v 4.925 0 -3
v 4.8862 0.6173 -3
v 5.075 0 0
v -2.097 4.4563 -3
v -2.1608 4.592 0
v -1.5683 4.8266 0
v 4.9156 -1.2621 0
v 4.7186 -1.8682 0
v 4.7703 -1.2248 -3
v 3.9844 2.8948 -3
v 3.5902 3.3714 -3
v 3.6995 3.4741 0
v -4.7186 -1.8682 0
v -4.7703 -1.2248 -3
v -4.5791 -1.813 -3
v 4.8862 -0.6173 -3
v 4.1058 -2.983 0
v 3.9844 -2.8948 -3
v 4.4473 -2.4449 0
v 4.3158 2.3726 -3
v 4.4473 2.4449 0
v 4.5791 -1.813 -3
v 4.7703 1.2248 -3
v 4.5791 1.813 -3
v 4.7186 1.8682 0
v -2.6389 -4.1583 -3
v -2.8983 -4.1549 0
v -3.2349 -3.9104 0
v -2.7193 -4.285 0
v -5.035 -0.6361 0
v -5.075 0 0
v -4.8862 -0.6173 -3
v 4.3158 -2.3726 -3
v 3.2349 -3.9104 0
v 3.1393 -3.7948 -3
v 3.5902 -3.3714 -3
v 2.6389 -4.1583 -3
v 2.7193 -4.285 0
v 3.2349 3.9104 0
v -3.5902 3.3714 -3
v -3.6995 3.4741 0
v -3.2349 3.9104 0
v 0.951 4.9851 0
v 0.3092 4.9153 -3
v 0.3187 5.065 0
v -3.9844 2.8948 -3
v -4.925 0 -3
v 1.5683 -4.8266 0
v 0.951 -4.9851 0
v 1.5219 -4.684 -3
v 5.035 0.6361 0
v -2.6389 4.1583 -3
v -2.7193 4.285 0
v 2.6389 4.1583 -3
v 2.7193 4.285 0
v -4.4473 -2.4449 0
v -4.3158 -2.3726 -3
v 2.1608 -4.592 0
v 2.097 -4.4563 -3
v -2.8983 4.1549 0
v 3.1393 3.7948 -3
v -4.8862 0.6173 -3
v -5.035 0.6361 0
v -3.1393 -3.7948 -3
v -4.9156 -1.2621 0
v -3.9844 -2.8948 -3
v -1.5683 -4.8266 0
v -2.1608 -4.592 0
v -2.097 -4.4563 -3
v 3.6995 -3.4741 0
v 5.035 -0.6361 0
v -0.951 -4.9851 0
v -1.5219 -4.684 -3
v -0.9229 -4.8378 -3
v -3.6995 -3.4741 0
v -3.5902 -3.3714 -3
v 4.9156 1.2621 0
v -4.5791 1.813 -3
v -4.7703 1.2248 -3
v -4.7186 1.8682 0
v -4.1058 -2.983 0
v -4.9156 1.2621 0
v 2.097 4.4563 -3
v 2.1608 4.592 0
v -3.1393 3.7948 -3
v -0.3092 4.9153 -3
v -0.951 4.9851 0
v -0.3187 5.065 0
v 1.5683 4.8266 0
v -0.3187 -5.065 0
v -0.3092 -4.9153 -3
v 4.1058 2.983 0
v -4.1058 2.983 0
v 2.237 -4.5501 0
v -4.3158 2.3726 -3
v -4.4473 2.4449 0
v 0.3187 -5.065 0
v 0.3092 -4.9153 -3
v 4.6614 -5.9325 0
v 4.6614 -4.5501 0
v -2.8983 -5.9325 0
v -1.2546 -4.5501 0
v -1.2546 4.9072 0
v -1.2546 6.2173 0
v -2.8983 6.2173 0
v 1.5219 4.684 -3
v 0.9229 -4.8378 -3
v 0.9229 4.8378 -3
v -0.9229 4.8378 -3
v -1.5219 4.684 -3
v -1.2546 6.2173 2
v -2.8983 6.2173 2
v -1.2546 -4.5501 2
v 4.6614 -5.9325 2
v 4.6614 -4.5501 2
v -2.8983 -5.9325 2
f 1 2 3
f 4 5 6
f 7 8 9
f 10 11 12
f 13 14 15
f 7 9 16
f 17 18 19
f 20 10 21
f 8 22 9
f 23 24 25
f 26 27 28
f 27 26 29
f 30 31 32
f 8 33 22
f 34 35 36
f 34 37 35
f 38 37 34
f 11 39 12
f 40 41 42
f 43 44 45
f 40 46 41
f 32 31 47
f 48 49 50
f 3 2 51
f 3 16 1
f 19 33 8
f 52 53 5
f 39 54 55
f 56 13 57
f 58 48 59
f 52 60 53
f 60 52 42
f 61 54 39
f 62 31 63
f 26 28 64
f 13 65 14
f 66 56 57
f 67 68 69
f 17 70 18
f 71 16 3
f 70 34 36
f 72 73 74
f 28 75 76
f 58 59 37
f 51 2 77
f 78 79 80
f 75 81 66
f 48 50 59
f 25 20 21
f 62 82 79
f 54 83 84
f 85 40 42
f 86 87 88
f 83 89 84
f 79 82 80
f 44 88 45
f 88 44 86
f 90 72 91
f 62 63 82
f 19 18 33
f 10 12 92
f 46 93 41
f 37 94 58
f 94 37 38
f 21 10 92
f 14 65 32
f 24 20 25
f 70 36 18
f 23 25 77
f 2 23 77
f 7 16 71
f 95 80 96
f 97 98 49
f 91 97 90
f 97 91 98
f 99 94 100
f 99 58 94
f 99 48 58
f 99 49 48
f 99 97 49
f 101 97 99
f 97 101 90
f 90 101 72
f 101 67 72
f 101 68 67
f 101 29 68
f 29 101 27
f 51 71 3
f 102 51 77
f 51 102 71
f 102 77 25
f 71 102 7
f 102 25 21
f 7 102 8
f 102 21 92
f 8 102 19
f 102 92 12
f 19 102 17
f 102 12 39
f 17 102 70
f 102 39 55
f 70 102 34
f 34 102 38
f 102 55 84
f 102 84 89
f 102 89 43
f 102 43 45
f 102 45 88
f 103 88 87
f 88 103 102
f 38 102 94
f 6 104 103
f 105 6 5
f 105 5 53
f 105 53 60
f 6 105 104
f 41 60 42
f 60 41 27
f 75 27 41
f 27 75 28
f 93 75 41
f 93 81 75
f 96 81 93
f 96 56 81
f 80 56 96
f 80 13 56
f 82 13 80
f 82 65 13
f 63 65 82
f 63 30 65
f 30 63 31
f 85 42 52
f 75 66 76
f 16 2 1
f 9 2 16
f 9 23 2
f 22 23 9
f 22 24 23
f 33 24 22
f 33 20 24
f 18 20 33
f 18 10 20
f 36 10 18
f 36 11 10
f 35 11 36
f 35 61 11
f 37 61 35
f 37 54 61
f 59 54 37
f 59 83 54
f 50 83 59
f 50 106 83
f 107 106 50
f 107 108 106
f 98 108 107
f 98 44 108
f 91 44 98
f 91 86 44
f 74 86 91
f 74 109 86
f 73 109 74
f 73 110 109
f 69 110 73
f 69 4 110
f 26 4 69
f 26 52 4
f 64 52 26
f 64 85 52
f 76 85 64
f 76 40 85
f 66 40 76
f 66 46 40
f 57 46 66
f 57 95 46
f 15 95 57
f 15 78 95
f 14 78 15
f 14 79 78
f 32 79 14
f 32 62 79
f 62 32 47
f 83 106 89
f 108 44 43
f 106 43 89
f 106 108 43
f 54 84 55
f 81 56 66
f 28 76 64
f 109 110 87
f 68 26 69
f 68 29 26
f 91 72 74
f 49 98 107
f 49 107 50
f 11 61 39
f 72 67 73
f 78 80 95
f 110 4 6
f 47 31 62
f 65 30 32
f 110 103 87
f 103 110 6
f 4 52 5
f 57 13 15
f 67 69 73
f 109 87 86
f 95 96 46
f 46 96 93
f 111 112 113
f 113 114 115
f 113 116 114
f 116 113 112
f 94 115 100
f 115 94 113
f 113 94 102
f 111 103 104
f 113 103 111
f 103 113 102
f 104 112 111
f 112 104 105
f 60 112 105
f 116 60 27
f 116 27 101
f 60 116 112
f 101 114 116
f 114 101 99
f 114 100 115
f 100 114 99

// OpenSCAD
$fn = 50;


difference() {
	union() {
		translate(v = [0, 0, -3.0000000000]) {
			cylinder(h = 3, r1 = 4.9250000000, r2 = 5.0750000000);
		}
		linear_extrude(height = 2) {
			text(font = "Impact", halign = "center", size = 12, text = "L", valign = "center");
		}
	}
	union();
}
